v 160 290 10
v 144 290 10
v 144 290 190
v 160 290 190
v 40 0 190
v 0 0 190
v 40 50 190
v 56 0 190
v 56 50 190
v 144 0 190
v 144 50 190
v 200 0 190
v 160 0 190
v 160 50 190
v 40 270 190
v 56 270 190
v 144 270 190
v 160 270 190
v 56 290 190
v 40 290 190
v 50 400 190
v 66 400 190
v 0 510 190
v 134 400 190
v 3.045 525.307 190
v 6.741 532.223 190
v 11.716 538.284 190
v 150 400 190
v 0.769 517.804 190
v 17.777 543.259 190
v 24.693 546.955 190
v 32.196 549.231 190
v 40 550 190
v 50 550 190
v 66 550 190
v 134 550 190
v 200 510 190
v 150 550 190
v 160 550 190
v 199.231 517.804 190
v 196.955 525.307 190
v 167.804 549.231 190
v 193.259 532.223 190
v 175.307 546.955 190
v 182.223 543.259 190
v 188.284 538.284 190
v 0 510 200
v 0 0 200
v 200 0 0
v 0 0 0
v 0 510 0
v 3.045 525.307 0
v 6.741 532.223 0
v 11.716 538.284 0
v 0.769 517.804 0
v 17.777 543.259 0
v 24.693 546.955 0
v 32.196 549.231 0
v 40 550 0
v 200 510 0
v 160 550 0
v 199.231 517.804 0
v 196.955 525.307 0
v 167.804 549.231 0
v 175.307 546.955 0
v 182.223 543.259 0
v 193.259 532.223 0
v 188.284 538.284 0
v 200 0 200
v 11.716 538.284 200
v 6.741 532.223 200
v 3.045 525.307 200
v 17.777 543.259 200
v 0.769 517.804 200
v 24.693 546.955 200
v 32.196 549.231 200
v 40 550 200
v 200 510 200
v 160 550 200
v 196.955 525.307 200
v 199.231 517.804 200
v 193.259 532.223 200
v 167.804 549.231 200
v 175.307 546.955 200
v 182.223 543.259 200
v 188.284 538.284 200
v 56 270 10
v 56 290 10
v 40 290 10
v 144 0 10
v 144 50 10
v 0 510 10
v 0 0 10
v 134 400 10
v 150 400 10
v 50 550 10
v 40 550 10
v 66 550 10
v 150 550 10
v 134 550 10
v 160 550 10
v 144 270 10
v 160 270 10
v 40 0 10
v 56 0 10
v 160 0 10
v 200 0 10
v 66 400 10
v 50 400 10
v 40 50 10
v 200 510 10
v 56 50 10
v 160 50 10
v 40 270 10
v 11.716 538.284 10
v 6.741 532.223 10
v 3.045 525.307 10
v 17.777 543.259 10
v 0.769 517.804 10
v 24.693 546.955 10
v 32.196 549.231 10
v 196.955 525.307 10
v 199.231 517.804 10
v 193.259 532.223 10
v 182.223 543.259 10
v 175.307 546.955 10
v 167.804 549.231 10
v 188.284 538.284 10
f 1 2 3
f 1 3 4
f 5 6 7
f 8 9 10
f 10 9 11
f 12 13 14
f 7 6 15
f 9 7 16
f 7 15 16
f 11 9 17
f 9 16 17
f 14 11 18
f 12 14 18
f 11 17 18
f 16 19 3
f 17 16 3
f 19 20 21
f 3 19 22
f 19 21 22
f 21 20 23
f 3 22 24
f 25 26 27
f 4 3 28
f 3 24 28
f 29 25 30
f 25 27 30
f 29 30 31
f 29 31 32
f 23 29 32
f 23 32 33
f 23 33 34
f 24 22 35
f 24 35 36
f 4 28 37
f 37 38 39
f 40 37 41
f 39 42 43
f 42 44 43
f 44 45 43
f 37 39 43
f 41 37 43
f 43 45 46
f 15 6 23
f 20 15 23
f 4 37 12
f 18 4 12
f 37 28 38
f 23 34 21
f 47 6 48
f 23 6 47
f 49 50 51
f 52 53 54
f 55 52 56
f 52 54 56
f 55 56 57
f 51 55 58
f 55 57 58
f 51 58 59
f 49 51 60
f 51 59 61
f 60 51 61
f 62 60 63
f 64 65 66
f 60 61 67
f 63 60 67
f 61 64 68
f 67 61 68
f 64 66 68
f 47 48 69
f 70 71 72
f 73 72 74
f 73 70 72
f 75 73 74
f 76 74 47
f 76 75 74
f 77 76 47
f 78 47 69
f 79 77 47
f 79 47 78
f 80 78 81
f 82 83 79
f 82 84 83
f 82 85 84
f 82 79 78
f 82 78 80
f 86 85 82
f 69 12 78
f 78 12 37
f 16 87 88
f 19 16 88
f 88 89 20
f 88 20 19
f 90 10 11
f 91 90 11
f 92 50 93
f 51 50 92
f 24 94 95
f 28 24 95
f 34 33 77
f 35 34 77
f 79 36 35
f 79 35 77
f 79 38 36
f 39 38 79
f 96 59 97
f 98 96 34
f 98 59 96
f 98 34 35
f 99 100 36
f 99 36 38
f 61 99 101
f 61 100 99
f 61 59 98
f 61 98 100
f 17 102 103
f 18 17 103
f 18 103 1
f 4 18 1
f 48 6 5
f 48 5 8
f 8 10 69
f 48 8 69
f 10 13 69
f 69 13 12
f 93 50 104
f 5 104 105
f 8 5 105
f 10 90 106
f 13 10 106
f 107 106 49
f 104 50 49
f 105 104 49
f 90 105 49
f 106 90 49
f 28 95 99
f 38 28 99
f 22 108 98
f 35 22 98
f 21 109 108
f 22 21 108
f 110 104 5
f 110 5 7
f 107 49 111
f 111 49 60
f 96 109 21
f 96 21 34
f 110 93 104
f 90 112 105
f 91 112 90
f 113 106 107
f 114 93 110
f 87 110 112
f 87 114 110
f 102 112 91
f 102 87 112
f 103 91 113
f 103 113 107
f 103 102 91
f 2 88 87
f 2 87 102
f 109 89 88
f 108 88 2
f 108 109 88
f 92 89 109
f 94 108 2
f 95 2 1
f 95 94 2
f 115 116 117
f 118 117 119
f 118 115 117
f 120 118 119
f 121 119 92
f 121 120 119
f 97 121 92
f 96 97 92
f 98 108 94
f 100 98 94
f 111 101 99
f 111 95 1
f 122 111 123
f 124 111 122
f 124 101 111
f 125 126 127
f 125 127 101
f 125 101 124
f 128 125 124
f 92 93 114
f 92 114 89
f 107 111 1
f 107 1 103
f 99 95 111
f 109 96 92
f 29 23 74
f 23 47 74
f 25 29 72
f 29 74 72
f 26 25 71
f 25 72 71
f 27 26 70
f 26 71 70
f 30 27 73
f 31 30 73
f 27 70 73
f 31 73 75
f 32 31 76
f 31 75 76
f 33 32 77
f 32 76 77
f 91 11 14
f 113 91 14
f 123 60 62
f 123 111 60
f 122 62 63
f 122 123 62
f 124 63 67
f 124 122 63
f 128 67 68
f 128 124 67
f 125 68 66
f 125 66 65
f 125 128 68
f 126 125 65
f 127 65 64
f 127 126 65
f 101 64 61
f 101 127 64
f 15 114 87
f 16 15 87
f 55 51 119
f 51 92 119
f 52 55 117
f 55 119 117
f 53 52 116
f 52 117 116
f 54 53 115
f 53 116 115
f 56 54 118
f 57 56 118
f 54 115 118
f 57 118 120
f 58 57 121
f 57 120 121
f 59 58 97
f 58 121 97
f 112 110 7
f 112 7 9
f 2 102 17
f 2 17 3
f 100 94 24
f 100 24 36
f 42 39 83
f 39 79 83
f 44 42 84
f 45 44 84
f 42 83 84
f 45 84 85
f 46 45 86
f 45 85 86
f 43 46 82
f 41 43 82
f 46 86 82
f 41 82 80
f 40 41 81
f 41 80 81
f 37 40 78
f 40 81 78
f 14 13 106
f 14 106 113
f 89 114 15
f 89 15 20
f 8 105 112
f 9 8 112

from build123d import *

# Parameters (mm, degrees)
SKETCH_1_W      = 200
SKETCH_1_H      = 550
EXTRUDE_2_DEPTH = 10
FILLET_2_R      = 40
SKETCH_2_W      = 16
SKETCH_2_H      = 50
SKETCH_2_H_2    = 20
SKETCH_2_H_3    = 150
EXTRUDE_4_DEPTH = 90
SKETCH_3_W      = 200
SKETCH_3_H      = 550
EXTRUDE_5_DEPTH = 10
FILLET_5_R      = 40


with BuildPart() as part:
    # 스케치1 → 보스-돌출2 (new body)
    with BuildSketch(Plane.XY):
        with Locations((100, 275)):
            Rectangle(SKETCH_1_W, SKETCH_1_H)
    extrude(amount=EXTRUDE_2_DEPTH)

    # 필렛2
    fillet_2_edges = [part.edges().sort_by_distance(p)[0] for p in [
        (0, 550, 5),
        (200, 550, 5),
    ]]
    fillet(fillet_2_edges, radius=FILLET_2_R)

    # 스케치2 → 보스-돌출4 (add)
    with BuildSketch(Plane.XY.offset(10)):
        with Locations((152, 25)):
            Rectangle(SKETCH_2_W, SKETCH_2_H)
        with Locations((152, 280)):
            Rectangle(SKETCH_2_W, SKETCH_2_H_2)
        with Locations((142, 475)):
            Rectangle(SKETCH_2_W, SKETCH_2_H_3)
        with Locations((48, 25)):
            Rectangle(SKETCH_2_W, SKETCH_2_H)
        with Locations((48, 280)):
            Rectangle(SKETCH_2_W, SKETCH_2_H_2)
        with Locations((58, 475)):
            Rectangle(SKETCH_2_W, SKETCH_2_H_3)
    extrude_4 = extrude(amount=EXTRUDE_4_DEPTH)

    # 대칭 복사26: 보스-돌출4 across plane
    add(extrude_4.mirror(Plane(origin=(0, 0, 100), x_dir=(1, 0, 0), z_dir=(0, 0, -1))))

    # 스케치3 → 보스-돌출5 (add)
    with BuildSketch(Plane.XY.offset(190)):
        with Locations((100, 275)):
            Rectangle(SKETCH_3_W, SKETCH_3_H)
    extrude(amount=EXTRUDE_5_DEPTH)

    # 필렛5
    fillet_5_edges = [part.edges().sort_by_distance(p)[0] for p in [
        (0, 550, 195),
        (200, 550, 195),
    ]]
    fillet(fillet_5_edges, radius=FILLET_5_R)


solid = part.part
